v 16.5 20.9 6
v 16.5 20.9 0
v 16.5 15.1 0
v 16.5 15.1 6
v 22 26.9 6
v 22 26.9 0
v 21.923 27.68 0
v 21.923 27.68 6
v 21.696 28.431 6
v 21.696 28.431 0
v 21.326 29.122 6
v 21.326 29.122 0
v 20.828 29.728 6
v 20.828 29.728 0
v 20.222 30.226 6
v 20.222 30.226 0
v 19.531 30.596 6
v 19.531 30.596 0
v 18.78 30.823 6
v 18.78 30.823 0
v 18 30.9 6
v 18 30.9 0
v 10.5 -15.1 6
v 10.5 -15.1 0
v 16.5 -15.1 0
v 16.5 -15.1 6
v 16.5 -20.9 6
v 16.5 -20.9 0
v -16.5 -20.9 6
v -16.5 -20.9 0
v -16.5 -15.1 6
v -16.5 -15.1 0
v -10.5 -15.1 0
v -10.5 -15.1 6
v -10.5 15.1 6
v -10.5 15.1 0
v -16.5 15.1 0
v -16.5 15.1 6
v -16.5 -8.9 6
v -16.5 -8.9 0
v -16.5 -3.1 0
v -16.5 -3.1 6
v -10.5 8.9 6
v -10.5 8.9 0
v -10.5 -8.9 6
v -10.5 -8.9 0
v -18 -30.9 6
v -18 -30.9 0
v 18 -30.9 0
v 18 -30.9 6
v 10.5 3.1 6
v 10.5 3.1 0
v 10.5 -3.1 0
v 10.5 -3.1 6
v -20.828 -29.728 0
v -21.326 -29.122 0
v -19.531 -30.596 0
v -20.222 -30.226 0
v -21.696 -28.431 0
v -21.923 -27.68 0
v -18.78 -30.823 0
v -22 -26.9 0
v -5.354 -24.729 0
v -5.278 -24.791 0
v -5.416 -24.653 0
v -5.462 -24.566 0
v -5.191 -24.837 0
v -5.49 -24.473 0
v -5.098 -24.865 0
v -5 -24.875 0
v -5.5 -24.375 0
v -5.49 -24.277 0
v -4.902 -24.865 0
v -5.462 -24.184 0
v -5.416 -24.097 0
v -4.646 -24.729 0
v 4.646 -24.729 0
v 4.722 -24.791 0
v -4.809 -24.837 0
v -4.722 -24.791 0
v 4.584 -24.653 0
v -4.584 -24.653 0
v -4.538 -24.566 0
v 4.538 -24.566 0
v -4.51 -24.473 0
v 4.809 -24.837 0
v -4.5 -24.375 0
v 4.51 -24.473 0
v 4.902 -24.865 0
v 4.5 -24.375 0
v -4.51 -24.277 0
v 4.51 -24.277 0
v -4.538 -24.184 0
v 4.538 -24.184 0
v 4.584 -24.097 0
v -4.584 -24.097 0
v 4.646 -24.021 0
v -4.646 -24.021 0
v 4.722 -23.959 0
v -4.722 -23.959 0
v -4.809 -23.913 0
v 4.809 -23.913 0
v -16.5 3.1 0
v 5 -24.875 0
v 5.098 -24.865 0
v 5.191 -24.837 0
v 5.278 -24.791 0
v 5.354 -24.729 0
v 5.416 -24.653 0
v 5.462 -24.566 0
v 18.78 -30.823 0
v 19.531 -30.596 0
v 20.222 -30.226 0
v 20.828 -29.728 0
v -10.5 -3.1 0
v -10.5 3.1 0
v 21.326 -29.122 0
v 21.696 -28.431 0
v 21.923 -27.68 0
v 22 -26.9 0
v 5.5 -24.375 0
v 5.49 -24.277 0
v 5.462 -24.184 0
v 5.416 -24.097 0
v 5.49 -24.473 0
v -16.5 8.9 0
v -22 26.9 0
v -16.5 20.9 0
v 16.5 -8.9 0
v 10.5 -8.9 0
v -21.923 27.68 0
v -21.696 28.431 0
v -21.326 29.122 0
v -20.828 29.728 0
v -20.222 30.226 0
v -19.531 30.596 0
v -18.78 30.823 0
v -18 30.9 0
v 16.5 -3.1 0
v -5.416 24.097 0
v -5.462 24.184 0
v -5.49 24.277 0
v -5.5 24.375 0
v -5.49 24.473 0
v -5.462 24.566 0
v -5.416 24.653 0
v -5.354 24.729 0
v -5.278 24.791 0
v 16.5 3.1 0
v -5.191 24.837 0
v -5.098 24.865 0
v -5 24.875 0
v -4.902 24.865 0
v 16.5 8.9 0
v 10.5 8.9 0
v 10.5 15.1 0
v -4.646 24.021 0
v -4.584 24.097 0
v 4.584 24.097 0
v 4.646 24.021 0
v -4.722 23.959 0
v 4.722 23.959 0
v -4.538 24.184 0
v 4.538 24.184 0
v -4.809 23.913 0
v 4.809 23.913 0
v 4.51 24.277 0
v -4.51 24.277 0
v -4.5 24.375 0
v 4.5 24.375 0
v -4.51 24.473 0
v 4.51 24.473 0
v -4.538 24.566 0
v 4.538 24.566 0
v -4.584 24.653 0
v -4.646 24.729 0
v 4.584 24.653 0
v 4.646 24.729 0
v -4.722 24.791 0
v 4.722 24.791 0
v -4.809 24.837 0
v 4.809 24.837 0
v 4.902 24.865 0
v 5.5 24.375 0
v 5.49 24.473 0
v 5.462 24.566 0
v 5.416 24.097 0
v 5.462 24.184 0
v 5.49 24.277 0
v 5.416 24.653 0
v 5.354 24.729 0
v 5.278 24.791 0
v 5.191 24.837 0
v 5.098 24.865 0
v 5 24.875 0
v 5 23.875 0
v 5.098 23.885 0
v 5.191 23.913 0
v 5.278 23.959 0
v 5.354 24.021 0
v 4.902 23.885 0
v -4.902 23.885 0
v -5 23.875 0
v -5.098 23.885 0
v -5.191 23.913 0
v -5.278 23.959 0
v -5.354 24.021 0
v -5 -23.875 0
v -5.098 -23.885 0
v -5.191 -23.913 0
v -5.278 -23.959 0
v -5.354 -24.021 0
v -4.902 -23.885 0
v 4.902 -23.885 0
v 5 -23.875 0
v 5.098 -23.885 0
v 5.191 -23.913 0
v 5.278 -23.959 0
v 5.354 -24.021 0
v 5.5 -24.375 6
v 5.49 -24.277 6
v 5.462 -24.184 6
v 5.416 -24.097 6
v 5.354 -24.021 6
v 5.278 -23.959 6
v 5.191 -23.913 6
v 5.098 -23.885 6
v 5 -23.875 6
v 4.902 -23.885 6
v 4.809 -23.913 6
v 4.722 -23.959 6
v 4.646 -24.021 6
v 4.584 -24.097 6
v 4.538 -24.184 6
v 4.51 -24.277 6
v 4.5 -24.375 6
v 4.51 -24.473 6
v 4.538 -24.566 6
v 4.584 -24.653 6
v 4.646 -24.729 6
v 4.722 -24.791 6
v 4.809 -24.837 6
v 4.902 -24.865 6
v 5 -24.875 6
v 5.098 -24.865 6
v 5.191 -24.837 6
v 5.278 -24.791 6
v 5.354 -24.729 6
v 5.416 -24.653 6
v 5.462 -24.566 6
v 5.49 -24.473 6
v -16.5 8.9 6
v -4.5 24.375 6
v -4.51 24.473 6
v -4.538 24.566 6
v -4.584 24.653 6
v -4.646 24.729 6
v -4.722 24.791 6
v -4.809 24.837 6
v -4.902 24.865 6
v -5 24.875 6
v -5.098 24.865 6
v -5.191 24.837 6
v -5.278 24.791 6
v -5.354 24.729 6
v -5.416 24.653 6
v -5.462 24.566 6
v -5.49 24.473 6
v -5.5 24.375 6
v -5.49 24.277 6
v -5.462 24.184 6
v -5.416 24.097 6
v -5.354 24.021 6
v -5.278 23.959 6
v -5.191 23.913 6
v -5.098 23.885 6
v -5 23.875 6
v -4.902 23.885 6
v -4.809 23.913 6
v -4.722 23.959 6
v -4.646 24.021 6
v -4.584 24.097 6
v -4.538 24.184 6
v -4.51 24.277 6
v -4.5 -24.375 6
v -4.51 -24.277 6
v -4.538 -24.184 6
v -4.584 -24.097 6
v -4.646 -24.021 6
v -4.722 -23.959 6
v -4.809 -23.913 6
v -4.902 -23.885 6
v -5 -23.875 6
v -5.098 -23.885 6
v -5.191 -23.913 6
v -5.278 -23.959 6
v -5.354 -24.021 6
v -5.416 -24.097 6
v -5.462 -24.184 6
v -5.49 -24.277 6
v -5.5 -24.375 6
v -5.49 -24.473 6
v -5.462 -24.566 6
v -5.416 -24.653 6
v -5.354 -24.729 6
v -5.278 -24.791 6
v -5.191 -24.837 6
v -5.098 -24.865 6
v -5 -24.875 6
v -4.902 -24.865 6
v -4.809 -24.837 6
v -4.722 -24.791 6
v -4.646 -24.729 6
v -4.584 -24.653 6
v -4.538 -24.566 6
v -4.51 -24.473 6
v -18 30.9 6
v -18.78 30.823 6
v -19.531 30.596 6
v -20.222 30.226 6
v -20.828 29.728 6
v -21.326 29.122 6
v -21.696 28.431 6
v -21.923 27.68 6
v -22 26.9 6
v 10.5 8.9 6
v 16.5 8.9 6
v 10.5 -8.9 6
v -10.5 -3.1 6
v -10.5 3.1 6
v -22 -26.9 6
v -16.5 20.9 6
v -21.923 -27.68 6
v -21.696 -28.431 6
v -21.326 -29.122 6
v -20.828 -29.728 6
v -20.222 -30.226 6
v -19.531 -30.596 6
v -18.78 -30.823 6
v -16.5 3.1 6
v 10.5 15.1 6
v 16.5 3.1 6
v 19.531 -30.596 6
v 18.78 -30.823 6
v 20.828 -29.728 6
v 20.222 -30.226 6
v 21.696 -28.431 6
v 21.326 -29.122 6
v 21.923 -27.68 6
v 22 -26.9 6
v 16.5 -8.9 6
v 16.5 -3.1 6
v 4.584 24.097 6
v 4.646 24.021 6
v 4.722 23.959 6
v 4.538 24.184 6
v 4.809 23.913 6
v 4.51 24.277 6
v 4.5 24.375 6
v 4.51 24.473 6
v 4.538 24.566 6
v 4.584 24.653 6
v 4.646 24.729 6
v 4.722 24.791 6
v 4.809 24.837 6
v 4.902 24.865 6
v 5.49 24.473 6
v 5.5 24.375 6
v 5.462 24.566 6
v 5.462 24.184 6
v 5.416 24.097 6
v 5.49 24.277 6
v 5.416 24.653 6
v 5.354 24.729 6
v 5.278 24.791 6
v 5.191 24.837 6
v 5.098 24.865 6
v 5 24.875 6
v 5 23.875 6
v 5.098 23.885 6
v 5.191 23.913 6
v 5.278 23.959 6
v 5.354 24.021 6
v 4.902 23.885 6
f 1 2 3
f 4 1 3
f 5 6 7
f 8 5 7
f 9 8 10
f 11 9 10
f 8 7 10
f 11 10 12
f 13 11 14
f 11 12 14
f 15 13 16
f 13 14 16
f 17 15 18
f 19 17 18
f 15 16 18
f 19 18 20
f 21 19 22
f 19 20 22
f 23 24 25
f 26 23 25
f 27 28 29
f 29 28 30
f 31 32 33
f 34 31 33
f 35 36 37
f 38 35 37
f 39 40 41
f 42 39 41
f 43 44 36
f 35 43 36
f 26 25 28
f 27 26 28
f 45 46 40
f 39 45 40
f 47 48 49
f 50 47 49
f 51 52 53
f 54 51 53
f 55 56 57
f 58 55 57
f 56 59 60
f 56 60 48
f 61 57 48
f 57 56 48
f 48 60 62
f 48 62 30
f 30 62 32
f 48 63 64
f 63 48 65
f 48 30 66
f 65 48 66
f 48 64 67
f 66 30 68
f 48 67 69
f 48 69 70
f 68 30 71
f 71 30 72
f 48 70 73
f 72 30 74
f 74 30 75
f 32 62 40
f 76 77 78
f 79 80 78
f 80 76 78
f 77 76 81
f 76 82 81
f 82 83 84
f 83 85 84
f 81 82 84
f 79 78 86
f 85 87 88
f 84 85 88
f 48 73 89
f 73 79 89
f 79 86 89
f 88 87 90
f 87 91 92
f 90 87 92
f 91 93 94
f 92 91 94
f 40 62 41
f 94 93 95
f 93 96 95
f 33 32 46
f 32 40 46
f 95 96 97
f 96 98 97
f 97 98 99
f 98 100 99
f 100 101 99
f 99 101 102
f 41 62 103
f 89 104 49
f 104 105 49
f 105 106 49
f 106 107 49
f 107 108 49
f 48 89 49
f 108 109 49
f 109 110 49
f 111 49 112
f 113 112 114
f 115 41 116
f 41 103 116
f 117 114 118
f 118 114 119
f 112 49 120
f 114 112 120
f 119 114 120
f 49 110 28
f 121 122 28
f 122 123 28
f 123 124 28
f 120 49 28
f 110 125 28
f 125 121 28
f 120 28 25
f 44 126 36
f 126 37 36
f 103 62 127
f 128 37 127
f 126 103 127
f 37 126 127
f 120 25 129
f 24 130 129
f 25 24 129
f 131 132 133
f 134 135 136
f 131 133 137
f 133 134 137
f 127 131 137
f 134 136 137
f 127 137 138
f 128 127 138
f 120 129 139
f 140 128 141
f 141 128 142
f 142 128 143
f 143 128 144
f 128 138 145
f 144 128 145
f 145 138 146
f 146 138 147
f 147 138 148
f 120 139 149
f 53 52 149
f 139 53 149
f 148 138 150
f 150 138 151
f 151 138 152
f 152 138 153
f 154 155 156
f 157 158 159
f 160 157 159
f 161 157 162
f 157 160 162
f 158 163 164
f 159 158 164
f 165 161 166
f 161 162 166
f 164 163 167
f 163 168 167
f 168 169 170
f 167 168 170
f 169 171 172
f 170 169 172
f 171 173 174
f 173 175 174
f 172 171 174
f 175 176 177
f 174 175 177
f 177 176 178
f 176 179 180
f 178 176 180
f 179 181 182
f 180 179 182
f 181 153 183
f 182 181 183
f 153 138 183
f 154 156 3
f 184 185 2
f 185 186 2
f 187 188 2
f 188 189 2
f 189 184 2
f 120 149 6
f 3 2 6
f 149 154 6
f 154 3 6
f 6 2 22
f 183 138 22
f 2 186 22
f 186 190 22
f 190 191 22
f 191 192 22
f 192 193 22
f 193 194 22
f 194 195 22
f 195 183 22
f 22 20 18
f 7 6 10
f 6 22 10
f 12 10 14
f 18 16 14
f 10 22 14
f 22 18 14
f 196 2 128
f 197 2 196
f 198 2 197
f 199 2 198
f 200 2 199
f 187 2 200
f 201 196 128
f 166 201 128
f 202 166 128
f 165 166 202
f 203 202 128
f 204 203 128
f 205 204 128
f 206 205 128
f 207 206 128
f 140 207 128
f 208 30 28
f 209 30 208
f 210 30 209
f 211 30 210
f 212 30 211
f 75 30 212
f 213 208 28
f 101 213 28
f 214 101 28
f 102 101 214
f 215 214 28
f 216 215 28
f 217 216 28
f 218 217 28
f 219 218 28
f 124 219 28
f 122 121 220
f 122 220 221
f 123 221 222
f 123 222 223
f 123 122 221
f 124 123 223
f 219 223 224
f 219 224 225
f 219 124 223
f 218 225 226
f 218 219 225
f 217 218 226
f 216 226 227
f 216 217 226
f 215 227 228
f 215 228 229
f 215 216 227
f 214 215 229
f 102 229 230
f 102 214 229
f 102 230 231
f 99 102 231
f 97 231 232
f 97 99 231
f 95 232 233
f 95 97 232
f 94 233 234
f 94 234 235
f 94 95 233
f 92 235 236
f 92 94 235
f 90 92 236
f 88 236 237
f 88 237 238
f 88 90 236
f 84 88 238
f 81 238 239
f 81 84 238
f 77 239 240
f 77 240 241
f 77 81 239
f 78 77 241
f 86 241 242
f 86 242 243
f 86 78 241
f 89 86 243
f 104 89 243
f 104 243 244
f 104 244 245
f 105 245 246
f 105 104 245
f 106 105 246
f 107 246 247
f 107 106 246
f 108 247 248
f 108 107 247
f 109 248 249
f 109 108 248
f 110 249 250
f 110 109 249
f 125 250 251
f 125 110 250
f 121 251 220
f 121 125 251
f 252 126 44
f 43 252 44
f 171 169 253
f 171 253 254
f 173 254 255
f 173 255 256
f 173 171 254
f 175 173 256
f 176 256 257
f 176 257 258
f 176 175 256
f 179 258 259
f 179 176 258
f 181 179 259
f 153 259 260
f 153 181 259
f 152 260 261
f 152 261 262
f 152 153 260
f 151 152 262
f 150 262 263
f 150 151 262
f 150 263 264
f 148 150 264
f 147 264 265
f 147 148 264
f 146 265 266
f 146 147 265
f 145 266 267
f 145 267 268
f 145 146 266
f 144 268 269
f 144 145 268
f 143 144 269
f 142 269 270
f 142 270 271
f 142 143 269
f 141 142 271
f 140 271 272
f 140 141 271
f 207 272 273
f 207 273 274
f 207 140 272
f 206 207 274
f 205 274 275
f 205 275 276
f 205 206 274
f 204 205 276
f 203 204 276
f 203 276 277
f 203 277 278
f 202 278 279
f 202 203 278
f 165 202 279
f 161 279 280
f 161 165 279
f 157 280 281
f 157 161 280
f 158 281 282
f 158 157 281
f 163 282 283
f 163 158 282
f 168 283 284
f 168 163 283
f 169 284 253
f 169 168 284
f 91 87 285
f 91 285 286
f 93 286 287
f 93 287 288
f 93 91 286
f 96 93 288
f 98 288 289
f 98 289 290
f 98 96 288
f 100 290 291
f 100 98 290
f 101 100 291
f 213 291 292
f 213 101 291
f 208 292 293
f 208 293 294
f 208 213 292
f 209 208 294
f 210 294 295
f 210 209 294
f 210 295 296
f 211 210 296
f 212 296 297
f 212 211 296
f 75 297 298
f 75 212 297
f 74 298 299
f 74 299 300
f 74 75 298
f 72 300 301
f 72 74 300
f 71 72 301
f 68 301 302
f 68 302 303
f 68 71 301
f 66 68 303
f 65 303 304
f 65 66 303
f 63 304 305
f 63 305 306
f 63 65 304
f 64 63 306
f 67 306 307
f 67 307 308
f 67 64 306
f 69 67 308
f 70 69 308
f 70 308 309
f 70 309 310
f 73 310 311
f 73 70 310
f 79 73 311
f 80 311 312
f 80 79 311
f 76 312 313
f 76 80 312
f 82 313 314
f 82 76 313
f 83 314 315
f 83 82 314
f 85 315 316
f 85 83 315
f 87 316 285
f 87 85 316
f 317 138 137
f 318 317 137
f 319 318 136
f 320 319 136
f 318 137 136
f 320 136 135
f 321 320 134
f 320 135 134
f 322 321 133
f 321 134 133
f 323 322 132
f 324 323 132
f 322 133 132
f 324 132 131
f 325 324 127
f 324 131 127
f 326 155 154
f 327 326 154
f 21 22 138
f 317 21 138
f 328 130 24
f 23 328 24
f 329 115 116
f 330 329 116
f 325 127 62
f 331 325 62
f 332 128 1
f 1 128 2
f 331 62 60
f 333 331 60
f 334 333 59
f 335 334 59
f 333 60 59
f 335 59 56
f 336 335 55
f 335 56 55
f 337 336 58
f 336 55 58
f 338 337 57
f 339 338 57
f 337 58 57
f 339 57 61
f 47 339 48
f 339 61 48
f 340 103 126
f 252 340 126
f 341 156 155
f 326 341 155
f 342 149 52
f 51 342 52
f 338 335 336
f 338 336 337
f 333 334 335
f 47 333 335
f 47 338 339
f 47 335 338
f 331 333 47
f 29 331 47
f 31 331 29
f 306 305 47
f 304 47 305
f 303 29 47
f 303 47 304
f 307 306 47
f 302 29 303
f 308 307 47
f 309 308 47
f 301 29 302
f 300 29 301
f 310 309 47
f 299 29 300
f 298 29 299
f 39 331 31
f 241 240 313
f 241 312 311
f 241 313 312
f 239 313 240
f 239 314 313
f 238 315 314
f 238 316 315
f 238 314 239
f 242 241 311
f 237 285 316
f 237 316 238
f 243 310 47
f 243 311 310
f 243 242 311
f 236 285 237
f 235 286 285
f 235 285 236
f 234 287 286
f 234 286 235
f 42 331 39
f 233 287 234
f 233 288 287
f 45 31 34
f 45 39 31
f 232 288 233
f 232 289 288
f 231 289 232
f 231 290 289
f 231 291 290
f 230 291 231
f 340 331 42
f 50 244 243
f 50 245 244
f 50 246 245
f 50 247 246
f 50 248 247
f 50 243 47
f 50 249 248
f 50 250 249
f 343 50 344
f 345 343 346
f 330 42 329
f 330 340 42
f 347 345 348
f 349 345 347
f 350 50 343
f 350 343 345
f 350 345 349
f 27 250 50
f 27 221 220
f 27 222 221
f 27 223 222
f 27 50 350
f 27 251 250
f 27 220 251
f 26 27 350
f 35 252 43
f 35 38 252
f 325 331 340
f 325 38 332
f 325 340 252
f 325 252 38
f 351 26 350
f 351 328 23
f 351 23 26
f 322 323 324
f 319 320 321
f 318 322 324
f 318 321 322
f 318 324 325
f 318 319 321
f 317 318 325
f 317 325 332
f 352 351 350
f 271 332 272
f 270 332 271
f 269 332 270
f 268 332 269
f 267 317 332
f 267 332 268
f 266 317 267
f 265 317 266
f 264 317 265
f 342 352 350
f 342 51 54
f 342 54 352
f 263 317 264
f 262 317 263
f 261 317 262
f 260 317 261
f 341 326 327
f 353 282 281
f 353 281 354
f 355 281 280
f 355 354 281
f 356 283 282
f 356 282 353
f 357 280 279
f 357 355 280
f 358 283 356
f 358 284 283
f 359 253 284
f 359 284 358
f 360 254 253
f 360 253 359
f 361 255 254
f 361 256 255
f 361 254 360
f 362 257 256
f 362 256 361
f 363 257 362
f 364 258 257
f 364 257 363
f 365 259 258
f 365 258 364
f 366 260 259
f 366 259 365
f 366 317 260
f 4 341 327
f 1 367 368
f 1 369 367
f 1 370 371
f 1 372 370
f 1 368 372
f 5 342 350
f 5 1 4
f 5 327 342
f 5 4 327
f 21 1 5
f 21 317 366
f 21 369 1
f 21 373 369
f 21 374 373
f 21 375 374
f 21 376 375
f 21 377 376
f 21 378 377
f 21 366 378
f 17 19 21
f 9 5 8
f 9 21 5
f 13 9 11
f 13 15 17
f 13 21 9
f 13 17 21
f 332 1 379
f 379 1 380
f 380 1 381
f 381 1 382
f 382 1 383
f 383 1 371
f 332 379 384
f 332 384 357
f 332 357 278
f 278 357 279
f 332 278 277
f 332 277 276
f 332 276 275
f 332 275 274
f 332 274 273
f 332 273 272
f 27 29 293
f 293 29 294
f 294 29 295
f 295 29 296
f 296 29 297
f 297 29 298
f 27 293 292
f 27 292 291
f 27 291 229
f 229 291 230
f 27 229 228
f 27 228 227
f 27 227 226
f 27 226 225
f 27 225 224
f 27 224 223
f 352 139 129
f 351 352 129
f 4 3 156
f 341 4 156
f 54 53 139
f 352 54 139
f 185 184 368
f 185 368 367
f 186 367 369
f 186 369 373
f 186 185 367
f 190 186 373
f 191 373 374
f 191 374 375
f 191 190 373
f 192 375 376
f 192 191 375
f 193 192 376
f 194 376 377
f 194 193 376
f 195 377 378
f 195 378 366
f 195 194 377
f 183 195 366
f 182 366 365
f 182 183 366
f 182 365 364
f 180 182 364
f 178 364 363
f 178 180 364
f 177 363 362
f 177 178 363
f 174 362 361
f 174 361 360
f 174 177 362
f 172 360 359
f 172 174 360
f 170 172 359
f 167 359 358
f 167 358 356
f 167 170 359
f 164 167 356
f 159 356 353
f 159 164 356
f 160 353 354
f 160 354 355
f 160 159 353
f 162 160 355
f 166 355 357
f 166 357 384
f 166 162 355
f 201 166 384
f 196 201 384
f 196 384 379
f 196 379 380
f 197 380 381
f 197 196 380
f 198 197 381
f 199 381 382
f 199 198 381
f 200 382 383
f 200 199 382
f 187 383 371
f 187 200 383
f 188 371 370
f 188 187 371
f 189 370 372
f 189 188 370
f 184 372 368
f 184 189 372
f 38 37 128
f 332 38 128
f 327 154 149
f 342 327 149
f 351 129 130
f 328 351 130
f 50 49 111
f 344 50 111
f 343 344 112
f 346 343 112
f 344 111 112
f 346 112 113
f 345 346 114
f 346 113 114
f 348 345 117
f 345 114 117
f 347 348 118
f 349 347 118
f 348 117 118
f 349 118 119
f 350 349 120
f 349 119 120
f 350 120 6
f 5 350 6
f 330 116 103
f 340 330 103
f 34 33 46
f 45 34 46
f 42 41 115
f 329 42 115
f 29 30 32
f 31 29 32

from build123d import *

# Parameters (mm, degrees)
F0_R     = 0.5
F1_DEPTH = 6


with BuildPart() as f1:
    # F0 (on Top) → F1 (new body)
    with BuildSketch(Plane.XY):
        with BuildLine():
            Line((18, 30.9), (-18, 30.9))
            ThreePointArc((-18, 30.9), (-20.828427, 29.728427), (-22, 26.9))
            Line((-22, 26.9), (-22, -26.9))
            ThreePointArc((-22, -26.9), (-20.828427, -29.728427), (-18, -30.9))
            Line((-18, -30.9), (18, -30.9))
            ThreePointArc((18, -30.9), (20.828427, -29.728427), (22, -26.9))
            Line((22, -26.9), (22, 26.9))
            ThreePointArc((22, 26.9), (20.828427, 29.728427), (18, 30.9))
        make_face()
        with Locations((-5, -24.375)):
            Circle(F0_R, mode=Mode.SUBTRACT)
        with Locations((5, -24.375)):
            Circle(F0_R, mode=Mode.SUBTRACT)
        with Locations((-5, 24.375)):
            Circle(F0_R, mode=Mode.SUBTRACT)
        Polygon((-16.5, 20.9), (-10.5, 20.9), (10.5, 20.9), (16.5, 20.9), (16.5, 15.1), (10.5, 15.1), (10.5, 8.9), (16.5, 8.9), (16.5, 3.1), (10.5, 3.1), (10.5, -3.1), (16.5, -3.1), (16.5, -8.9), (10.5, -8.9), (10.5, -15.1), (16.5, -15.1), (16.5, -20.9), (10.5, -20.9), (-10.5, -20.9), (-16.5, -20.9), (-16.5, -15.1), (-10.5, -15.1), (-10.5, -8.9), (-16.5, -8.9), (-16.5, -3.1), (-10.5, -3.1), (-10.5, 3.1), (-16.5, 3.1), (-16.5, 8.9), (-10.5, 8.9), (-10.5, 15.1), (-16.5, 15.1), align=None, mode=Mode.SUBTRACT)
        with Locations((5, 24.375)):
            Circle(F0_R, mode=Mode.SUBTRACT)
    extrude(amount=F1_DEPTH)


solid = f1.part
